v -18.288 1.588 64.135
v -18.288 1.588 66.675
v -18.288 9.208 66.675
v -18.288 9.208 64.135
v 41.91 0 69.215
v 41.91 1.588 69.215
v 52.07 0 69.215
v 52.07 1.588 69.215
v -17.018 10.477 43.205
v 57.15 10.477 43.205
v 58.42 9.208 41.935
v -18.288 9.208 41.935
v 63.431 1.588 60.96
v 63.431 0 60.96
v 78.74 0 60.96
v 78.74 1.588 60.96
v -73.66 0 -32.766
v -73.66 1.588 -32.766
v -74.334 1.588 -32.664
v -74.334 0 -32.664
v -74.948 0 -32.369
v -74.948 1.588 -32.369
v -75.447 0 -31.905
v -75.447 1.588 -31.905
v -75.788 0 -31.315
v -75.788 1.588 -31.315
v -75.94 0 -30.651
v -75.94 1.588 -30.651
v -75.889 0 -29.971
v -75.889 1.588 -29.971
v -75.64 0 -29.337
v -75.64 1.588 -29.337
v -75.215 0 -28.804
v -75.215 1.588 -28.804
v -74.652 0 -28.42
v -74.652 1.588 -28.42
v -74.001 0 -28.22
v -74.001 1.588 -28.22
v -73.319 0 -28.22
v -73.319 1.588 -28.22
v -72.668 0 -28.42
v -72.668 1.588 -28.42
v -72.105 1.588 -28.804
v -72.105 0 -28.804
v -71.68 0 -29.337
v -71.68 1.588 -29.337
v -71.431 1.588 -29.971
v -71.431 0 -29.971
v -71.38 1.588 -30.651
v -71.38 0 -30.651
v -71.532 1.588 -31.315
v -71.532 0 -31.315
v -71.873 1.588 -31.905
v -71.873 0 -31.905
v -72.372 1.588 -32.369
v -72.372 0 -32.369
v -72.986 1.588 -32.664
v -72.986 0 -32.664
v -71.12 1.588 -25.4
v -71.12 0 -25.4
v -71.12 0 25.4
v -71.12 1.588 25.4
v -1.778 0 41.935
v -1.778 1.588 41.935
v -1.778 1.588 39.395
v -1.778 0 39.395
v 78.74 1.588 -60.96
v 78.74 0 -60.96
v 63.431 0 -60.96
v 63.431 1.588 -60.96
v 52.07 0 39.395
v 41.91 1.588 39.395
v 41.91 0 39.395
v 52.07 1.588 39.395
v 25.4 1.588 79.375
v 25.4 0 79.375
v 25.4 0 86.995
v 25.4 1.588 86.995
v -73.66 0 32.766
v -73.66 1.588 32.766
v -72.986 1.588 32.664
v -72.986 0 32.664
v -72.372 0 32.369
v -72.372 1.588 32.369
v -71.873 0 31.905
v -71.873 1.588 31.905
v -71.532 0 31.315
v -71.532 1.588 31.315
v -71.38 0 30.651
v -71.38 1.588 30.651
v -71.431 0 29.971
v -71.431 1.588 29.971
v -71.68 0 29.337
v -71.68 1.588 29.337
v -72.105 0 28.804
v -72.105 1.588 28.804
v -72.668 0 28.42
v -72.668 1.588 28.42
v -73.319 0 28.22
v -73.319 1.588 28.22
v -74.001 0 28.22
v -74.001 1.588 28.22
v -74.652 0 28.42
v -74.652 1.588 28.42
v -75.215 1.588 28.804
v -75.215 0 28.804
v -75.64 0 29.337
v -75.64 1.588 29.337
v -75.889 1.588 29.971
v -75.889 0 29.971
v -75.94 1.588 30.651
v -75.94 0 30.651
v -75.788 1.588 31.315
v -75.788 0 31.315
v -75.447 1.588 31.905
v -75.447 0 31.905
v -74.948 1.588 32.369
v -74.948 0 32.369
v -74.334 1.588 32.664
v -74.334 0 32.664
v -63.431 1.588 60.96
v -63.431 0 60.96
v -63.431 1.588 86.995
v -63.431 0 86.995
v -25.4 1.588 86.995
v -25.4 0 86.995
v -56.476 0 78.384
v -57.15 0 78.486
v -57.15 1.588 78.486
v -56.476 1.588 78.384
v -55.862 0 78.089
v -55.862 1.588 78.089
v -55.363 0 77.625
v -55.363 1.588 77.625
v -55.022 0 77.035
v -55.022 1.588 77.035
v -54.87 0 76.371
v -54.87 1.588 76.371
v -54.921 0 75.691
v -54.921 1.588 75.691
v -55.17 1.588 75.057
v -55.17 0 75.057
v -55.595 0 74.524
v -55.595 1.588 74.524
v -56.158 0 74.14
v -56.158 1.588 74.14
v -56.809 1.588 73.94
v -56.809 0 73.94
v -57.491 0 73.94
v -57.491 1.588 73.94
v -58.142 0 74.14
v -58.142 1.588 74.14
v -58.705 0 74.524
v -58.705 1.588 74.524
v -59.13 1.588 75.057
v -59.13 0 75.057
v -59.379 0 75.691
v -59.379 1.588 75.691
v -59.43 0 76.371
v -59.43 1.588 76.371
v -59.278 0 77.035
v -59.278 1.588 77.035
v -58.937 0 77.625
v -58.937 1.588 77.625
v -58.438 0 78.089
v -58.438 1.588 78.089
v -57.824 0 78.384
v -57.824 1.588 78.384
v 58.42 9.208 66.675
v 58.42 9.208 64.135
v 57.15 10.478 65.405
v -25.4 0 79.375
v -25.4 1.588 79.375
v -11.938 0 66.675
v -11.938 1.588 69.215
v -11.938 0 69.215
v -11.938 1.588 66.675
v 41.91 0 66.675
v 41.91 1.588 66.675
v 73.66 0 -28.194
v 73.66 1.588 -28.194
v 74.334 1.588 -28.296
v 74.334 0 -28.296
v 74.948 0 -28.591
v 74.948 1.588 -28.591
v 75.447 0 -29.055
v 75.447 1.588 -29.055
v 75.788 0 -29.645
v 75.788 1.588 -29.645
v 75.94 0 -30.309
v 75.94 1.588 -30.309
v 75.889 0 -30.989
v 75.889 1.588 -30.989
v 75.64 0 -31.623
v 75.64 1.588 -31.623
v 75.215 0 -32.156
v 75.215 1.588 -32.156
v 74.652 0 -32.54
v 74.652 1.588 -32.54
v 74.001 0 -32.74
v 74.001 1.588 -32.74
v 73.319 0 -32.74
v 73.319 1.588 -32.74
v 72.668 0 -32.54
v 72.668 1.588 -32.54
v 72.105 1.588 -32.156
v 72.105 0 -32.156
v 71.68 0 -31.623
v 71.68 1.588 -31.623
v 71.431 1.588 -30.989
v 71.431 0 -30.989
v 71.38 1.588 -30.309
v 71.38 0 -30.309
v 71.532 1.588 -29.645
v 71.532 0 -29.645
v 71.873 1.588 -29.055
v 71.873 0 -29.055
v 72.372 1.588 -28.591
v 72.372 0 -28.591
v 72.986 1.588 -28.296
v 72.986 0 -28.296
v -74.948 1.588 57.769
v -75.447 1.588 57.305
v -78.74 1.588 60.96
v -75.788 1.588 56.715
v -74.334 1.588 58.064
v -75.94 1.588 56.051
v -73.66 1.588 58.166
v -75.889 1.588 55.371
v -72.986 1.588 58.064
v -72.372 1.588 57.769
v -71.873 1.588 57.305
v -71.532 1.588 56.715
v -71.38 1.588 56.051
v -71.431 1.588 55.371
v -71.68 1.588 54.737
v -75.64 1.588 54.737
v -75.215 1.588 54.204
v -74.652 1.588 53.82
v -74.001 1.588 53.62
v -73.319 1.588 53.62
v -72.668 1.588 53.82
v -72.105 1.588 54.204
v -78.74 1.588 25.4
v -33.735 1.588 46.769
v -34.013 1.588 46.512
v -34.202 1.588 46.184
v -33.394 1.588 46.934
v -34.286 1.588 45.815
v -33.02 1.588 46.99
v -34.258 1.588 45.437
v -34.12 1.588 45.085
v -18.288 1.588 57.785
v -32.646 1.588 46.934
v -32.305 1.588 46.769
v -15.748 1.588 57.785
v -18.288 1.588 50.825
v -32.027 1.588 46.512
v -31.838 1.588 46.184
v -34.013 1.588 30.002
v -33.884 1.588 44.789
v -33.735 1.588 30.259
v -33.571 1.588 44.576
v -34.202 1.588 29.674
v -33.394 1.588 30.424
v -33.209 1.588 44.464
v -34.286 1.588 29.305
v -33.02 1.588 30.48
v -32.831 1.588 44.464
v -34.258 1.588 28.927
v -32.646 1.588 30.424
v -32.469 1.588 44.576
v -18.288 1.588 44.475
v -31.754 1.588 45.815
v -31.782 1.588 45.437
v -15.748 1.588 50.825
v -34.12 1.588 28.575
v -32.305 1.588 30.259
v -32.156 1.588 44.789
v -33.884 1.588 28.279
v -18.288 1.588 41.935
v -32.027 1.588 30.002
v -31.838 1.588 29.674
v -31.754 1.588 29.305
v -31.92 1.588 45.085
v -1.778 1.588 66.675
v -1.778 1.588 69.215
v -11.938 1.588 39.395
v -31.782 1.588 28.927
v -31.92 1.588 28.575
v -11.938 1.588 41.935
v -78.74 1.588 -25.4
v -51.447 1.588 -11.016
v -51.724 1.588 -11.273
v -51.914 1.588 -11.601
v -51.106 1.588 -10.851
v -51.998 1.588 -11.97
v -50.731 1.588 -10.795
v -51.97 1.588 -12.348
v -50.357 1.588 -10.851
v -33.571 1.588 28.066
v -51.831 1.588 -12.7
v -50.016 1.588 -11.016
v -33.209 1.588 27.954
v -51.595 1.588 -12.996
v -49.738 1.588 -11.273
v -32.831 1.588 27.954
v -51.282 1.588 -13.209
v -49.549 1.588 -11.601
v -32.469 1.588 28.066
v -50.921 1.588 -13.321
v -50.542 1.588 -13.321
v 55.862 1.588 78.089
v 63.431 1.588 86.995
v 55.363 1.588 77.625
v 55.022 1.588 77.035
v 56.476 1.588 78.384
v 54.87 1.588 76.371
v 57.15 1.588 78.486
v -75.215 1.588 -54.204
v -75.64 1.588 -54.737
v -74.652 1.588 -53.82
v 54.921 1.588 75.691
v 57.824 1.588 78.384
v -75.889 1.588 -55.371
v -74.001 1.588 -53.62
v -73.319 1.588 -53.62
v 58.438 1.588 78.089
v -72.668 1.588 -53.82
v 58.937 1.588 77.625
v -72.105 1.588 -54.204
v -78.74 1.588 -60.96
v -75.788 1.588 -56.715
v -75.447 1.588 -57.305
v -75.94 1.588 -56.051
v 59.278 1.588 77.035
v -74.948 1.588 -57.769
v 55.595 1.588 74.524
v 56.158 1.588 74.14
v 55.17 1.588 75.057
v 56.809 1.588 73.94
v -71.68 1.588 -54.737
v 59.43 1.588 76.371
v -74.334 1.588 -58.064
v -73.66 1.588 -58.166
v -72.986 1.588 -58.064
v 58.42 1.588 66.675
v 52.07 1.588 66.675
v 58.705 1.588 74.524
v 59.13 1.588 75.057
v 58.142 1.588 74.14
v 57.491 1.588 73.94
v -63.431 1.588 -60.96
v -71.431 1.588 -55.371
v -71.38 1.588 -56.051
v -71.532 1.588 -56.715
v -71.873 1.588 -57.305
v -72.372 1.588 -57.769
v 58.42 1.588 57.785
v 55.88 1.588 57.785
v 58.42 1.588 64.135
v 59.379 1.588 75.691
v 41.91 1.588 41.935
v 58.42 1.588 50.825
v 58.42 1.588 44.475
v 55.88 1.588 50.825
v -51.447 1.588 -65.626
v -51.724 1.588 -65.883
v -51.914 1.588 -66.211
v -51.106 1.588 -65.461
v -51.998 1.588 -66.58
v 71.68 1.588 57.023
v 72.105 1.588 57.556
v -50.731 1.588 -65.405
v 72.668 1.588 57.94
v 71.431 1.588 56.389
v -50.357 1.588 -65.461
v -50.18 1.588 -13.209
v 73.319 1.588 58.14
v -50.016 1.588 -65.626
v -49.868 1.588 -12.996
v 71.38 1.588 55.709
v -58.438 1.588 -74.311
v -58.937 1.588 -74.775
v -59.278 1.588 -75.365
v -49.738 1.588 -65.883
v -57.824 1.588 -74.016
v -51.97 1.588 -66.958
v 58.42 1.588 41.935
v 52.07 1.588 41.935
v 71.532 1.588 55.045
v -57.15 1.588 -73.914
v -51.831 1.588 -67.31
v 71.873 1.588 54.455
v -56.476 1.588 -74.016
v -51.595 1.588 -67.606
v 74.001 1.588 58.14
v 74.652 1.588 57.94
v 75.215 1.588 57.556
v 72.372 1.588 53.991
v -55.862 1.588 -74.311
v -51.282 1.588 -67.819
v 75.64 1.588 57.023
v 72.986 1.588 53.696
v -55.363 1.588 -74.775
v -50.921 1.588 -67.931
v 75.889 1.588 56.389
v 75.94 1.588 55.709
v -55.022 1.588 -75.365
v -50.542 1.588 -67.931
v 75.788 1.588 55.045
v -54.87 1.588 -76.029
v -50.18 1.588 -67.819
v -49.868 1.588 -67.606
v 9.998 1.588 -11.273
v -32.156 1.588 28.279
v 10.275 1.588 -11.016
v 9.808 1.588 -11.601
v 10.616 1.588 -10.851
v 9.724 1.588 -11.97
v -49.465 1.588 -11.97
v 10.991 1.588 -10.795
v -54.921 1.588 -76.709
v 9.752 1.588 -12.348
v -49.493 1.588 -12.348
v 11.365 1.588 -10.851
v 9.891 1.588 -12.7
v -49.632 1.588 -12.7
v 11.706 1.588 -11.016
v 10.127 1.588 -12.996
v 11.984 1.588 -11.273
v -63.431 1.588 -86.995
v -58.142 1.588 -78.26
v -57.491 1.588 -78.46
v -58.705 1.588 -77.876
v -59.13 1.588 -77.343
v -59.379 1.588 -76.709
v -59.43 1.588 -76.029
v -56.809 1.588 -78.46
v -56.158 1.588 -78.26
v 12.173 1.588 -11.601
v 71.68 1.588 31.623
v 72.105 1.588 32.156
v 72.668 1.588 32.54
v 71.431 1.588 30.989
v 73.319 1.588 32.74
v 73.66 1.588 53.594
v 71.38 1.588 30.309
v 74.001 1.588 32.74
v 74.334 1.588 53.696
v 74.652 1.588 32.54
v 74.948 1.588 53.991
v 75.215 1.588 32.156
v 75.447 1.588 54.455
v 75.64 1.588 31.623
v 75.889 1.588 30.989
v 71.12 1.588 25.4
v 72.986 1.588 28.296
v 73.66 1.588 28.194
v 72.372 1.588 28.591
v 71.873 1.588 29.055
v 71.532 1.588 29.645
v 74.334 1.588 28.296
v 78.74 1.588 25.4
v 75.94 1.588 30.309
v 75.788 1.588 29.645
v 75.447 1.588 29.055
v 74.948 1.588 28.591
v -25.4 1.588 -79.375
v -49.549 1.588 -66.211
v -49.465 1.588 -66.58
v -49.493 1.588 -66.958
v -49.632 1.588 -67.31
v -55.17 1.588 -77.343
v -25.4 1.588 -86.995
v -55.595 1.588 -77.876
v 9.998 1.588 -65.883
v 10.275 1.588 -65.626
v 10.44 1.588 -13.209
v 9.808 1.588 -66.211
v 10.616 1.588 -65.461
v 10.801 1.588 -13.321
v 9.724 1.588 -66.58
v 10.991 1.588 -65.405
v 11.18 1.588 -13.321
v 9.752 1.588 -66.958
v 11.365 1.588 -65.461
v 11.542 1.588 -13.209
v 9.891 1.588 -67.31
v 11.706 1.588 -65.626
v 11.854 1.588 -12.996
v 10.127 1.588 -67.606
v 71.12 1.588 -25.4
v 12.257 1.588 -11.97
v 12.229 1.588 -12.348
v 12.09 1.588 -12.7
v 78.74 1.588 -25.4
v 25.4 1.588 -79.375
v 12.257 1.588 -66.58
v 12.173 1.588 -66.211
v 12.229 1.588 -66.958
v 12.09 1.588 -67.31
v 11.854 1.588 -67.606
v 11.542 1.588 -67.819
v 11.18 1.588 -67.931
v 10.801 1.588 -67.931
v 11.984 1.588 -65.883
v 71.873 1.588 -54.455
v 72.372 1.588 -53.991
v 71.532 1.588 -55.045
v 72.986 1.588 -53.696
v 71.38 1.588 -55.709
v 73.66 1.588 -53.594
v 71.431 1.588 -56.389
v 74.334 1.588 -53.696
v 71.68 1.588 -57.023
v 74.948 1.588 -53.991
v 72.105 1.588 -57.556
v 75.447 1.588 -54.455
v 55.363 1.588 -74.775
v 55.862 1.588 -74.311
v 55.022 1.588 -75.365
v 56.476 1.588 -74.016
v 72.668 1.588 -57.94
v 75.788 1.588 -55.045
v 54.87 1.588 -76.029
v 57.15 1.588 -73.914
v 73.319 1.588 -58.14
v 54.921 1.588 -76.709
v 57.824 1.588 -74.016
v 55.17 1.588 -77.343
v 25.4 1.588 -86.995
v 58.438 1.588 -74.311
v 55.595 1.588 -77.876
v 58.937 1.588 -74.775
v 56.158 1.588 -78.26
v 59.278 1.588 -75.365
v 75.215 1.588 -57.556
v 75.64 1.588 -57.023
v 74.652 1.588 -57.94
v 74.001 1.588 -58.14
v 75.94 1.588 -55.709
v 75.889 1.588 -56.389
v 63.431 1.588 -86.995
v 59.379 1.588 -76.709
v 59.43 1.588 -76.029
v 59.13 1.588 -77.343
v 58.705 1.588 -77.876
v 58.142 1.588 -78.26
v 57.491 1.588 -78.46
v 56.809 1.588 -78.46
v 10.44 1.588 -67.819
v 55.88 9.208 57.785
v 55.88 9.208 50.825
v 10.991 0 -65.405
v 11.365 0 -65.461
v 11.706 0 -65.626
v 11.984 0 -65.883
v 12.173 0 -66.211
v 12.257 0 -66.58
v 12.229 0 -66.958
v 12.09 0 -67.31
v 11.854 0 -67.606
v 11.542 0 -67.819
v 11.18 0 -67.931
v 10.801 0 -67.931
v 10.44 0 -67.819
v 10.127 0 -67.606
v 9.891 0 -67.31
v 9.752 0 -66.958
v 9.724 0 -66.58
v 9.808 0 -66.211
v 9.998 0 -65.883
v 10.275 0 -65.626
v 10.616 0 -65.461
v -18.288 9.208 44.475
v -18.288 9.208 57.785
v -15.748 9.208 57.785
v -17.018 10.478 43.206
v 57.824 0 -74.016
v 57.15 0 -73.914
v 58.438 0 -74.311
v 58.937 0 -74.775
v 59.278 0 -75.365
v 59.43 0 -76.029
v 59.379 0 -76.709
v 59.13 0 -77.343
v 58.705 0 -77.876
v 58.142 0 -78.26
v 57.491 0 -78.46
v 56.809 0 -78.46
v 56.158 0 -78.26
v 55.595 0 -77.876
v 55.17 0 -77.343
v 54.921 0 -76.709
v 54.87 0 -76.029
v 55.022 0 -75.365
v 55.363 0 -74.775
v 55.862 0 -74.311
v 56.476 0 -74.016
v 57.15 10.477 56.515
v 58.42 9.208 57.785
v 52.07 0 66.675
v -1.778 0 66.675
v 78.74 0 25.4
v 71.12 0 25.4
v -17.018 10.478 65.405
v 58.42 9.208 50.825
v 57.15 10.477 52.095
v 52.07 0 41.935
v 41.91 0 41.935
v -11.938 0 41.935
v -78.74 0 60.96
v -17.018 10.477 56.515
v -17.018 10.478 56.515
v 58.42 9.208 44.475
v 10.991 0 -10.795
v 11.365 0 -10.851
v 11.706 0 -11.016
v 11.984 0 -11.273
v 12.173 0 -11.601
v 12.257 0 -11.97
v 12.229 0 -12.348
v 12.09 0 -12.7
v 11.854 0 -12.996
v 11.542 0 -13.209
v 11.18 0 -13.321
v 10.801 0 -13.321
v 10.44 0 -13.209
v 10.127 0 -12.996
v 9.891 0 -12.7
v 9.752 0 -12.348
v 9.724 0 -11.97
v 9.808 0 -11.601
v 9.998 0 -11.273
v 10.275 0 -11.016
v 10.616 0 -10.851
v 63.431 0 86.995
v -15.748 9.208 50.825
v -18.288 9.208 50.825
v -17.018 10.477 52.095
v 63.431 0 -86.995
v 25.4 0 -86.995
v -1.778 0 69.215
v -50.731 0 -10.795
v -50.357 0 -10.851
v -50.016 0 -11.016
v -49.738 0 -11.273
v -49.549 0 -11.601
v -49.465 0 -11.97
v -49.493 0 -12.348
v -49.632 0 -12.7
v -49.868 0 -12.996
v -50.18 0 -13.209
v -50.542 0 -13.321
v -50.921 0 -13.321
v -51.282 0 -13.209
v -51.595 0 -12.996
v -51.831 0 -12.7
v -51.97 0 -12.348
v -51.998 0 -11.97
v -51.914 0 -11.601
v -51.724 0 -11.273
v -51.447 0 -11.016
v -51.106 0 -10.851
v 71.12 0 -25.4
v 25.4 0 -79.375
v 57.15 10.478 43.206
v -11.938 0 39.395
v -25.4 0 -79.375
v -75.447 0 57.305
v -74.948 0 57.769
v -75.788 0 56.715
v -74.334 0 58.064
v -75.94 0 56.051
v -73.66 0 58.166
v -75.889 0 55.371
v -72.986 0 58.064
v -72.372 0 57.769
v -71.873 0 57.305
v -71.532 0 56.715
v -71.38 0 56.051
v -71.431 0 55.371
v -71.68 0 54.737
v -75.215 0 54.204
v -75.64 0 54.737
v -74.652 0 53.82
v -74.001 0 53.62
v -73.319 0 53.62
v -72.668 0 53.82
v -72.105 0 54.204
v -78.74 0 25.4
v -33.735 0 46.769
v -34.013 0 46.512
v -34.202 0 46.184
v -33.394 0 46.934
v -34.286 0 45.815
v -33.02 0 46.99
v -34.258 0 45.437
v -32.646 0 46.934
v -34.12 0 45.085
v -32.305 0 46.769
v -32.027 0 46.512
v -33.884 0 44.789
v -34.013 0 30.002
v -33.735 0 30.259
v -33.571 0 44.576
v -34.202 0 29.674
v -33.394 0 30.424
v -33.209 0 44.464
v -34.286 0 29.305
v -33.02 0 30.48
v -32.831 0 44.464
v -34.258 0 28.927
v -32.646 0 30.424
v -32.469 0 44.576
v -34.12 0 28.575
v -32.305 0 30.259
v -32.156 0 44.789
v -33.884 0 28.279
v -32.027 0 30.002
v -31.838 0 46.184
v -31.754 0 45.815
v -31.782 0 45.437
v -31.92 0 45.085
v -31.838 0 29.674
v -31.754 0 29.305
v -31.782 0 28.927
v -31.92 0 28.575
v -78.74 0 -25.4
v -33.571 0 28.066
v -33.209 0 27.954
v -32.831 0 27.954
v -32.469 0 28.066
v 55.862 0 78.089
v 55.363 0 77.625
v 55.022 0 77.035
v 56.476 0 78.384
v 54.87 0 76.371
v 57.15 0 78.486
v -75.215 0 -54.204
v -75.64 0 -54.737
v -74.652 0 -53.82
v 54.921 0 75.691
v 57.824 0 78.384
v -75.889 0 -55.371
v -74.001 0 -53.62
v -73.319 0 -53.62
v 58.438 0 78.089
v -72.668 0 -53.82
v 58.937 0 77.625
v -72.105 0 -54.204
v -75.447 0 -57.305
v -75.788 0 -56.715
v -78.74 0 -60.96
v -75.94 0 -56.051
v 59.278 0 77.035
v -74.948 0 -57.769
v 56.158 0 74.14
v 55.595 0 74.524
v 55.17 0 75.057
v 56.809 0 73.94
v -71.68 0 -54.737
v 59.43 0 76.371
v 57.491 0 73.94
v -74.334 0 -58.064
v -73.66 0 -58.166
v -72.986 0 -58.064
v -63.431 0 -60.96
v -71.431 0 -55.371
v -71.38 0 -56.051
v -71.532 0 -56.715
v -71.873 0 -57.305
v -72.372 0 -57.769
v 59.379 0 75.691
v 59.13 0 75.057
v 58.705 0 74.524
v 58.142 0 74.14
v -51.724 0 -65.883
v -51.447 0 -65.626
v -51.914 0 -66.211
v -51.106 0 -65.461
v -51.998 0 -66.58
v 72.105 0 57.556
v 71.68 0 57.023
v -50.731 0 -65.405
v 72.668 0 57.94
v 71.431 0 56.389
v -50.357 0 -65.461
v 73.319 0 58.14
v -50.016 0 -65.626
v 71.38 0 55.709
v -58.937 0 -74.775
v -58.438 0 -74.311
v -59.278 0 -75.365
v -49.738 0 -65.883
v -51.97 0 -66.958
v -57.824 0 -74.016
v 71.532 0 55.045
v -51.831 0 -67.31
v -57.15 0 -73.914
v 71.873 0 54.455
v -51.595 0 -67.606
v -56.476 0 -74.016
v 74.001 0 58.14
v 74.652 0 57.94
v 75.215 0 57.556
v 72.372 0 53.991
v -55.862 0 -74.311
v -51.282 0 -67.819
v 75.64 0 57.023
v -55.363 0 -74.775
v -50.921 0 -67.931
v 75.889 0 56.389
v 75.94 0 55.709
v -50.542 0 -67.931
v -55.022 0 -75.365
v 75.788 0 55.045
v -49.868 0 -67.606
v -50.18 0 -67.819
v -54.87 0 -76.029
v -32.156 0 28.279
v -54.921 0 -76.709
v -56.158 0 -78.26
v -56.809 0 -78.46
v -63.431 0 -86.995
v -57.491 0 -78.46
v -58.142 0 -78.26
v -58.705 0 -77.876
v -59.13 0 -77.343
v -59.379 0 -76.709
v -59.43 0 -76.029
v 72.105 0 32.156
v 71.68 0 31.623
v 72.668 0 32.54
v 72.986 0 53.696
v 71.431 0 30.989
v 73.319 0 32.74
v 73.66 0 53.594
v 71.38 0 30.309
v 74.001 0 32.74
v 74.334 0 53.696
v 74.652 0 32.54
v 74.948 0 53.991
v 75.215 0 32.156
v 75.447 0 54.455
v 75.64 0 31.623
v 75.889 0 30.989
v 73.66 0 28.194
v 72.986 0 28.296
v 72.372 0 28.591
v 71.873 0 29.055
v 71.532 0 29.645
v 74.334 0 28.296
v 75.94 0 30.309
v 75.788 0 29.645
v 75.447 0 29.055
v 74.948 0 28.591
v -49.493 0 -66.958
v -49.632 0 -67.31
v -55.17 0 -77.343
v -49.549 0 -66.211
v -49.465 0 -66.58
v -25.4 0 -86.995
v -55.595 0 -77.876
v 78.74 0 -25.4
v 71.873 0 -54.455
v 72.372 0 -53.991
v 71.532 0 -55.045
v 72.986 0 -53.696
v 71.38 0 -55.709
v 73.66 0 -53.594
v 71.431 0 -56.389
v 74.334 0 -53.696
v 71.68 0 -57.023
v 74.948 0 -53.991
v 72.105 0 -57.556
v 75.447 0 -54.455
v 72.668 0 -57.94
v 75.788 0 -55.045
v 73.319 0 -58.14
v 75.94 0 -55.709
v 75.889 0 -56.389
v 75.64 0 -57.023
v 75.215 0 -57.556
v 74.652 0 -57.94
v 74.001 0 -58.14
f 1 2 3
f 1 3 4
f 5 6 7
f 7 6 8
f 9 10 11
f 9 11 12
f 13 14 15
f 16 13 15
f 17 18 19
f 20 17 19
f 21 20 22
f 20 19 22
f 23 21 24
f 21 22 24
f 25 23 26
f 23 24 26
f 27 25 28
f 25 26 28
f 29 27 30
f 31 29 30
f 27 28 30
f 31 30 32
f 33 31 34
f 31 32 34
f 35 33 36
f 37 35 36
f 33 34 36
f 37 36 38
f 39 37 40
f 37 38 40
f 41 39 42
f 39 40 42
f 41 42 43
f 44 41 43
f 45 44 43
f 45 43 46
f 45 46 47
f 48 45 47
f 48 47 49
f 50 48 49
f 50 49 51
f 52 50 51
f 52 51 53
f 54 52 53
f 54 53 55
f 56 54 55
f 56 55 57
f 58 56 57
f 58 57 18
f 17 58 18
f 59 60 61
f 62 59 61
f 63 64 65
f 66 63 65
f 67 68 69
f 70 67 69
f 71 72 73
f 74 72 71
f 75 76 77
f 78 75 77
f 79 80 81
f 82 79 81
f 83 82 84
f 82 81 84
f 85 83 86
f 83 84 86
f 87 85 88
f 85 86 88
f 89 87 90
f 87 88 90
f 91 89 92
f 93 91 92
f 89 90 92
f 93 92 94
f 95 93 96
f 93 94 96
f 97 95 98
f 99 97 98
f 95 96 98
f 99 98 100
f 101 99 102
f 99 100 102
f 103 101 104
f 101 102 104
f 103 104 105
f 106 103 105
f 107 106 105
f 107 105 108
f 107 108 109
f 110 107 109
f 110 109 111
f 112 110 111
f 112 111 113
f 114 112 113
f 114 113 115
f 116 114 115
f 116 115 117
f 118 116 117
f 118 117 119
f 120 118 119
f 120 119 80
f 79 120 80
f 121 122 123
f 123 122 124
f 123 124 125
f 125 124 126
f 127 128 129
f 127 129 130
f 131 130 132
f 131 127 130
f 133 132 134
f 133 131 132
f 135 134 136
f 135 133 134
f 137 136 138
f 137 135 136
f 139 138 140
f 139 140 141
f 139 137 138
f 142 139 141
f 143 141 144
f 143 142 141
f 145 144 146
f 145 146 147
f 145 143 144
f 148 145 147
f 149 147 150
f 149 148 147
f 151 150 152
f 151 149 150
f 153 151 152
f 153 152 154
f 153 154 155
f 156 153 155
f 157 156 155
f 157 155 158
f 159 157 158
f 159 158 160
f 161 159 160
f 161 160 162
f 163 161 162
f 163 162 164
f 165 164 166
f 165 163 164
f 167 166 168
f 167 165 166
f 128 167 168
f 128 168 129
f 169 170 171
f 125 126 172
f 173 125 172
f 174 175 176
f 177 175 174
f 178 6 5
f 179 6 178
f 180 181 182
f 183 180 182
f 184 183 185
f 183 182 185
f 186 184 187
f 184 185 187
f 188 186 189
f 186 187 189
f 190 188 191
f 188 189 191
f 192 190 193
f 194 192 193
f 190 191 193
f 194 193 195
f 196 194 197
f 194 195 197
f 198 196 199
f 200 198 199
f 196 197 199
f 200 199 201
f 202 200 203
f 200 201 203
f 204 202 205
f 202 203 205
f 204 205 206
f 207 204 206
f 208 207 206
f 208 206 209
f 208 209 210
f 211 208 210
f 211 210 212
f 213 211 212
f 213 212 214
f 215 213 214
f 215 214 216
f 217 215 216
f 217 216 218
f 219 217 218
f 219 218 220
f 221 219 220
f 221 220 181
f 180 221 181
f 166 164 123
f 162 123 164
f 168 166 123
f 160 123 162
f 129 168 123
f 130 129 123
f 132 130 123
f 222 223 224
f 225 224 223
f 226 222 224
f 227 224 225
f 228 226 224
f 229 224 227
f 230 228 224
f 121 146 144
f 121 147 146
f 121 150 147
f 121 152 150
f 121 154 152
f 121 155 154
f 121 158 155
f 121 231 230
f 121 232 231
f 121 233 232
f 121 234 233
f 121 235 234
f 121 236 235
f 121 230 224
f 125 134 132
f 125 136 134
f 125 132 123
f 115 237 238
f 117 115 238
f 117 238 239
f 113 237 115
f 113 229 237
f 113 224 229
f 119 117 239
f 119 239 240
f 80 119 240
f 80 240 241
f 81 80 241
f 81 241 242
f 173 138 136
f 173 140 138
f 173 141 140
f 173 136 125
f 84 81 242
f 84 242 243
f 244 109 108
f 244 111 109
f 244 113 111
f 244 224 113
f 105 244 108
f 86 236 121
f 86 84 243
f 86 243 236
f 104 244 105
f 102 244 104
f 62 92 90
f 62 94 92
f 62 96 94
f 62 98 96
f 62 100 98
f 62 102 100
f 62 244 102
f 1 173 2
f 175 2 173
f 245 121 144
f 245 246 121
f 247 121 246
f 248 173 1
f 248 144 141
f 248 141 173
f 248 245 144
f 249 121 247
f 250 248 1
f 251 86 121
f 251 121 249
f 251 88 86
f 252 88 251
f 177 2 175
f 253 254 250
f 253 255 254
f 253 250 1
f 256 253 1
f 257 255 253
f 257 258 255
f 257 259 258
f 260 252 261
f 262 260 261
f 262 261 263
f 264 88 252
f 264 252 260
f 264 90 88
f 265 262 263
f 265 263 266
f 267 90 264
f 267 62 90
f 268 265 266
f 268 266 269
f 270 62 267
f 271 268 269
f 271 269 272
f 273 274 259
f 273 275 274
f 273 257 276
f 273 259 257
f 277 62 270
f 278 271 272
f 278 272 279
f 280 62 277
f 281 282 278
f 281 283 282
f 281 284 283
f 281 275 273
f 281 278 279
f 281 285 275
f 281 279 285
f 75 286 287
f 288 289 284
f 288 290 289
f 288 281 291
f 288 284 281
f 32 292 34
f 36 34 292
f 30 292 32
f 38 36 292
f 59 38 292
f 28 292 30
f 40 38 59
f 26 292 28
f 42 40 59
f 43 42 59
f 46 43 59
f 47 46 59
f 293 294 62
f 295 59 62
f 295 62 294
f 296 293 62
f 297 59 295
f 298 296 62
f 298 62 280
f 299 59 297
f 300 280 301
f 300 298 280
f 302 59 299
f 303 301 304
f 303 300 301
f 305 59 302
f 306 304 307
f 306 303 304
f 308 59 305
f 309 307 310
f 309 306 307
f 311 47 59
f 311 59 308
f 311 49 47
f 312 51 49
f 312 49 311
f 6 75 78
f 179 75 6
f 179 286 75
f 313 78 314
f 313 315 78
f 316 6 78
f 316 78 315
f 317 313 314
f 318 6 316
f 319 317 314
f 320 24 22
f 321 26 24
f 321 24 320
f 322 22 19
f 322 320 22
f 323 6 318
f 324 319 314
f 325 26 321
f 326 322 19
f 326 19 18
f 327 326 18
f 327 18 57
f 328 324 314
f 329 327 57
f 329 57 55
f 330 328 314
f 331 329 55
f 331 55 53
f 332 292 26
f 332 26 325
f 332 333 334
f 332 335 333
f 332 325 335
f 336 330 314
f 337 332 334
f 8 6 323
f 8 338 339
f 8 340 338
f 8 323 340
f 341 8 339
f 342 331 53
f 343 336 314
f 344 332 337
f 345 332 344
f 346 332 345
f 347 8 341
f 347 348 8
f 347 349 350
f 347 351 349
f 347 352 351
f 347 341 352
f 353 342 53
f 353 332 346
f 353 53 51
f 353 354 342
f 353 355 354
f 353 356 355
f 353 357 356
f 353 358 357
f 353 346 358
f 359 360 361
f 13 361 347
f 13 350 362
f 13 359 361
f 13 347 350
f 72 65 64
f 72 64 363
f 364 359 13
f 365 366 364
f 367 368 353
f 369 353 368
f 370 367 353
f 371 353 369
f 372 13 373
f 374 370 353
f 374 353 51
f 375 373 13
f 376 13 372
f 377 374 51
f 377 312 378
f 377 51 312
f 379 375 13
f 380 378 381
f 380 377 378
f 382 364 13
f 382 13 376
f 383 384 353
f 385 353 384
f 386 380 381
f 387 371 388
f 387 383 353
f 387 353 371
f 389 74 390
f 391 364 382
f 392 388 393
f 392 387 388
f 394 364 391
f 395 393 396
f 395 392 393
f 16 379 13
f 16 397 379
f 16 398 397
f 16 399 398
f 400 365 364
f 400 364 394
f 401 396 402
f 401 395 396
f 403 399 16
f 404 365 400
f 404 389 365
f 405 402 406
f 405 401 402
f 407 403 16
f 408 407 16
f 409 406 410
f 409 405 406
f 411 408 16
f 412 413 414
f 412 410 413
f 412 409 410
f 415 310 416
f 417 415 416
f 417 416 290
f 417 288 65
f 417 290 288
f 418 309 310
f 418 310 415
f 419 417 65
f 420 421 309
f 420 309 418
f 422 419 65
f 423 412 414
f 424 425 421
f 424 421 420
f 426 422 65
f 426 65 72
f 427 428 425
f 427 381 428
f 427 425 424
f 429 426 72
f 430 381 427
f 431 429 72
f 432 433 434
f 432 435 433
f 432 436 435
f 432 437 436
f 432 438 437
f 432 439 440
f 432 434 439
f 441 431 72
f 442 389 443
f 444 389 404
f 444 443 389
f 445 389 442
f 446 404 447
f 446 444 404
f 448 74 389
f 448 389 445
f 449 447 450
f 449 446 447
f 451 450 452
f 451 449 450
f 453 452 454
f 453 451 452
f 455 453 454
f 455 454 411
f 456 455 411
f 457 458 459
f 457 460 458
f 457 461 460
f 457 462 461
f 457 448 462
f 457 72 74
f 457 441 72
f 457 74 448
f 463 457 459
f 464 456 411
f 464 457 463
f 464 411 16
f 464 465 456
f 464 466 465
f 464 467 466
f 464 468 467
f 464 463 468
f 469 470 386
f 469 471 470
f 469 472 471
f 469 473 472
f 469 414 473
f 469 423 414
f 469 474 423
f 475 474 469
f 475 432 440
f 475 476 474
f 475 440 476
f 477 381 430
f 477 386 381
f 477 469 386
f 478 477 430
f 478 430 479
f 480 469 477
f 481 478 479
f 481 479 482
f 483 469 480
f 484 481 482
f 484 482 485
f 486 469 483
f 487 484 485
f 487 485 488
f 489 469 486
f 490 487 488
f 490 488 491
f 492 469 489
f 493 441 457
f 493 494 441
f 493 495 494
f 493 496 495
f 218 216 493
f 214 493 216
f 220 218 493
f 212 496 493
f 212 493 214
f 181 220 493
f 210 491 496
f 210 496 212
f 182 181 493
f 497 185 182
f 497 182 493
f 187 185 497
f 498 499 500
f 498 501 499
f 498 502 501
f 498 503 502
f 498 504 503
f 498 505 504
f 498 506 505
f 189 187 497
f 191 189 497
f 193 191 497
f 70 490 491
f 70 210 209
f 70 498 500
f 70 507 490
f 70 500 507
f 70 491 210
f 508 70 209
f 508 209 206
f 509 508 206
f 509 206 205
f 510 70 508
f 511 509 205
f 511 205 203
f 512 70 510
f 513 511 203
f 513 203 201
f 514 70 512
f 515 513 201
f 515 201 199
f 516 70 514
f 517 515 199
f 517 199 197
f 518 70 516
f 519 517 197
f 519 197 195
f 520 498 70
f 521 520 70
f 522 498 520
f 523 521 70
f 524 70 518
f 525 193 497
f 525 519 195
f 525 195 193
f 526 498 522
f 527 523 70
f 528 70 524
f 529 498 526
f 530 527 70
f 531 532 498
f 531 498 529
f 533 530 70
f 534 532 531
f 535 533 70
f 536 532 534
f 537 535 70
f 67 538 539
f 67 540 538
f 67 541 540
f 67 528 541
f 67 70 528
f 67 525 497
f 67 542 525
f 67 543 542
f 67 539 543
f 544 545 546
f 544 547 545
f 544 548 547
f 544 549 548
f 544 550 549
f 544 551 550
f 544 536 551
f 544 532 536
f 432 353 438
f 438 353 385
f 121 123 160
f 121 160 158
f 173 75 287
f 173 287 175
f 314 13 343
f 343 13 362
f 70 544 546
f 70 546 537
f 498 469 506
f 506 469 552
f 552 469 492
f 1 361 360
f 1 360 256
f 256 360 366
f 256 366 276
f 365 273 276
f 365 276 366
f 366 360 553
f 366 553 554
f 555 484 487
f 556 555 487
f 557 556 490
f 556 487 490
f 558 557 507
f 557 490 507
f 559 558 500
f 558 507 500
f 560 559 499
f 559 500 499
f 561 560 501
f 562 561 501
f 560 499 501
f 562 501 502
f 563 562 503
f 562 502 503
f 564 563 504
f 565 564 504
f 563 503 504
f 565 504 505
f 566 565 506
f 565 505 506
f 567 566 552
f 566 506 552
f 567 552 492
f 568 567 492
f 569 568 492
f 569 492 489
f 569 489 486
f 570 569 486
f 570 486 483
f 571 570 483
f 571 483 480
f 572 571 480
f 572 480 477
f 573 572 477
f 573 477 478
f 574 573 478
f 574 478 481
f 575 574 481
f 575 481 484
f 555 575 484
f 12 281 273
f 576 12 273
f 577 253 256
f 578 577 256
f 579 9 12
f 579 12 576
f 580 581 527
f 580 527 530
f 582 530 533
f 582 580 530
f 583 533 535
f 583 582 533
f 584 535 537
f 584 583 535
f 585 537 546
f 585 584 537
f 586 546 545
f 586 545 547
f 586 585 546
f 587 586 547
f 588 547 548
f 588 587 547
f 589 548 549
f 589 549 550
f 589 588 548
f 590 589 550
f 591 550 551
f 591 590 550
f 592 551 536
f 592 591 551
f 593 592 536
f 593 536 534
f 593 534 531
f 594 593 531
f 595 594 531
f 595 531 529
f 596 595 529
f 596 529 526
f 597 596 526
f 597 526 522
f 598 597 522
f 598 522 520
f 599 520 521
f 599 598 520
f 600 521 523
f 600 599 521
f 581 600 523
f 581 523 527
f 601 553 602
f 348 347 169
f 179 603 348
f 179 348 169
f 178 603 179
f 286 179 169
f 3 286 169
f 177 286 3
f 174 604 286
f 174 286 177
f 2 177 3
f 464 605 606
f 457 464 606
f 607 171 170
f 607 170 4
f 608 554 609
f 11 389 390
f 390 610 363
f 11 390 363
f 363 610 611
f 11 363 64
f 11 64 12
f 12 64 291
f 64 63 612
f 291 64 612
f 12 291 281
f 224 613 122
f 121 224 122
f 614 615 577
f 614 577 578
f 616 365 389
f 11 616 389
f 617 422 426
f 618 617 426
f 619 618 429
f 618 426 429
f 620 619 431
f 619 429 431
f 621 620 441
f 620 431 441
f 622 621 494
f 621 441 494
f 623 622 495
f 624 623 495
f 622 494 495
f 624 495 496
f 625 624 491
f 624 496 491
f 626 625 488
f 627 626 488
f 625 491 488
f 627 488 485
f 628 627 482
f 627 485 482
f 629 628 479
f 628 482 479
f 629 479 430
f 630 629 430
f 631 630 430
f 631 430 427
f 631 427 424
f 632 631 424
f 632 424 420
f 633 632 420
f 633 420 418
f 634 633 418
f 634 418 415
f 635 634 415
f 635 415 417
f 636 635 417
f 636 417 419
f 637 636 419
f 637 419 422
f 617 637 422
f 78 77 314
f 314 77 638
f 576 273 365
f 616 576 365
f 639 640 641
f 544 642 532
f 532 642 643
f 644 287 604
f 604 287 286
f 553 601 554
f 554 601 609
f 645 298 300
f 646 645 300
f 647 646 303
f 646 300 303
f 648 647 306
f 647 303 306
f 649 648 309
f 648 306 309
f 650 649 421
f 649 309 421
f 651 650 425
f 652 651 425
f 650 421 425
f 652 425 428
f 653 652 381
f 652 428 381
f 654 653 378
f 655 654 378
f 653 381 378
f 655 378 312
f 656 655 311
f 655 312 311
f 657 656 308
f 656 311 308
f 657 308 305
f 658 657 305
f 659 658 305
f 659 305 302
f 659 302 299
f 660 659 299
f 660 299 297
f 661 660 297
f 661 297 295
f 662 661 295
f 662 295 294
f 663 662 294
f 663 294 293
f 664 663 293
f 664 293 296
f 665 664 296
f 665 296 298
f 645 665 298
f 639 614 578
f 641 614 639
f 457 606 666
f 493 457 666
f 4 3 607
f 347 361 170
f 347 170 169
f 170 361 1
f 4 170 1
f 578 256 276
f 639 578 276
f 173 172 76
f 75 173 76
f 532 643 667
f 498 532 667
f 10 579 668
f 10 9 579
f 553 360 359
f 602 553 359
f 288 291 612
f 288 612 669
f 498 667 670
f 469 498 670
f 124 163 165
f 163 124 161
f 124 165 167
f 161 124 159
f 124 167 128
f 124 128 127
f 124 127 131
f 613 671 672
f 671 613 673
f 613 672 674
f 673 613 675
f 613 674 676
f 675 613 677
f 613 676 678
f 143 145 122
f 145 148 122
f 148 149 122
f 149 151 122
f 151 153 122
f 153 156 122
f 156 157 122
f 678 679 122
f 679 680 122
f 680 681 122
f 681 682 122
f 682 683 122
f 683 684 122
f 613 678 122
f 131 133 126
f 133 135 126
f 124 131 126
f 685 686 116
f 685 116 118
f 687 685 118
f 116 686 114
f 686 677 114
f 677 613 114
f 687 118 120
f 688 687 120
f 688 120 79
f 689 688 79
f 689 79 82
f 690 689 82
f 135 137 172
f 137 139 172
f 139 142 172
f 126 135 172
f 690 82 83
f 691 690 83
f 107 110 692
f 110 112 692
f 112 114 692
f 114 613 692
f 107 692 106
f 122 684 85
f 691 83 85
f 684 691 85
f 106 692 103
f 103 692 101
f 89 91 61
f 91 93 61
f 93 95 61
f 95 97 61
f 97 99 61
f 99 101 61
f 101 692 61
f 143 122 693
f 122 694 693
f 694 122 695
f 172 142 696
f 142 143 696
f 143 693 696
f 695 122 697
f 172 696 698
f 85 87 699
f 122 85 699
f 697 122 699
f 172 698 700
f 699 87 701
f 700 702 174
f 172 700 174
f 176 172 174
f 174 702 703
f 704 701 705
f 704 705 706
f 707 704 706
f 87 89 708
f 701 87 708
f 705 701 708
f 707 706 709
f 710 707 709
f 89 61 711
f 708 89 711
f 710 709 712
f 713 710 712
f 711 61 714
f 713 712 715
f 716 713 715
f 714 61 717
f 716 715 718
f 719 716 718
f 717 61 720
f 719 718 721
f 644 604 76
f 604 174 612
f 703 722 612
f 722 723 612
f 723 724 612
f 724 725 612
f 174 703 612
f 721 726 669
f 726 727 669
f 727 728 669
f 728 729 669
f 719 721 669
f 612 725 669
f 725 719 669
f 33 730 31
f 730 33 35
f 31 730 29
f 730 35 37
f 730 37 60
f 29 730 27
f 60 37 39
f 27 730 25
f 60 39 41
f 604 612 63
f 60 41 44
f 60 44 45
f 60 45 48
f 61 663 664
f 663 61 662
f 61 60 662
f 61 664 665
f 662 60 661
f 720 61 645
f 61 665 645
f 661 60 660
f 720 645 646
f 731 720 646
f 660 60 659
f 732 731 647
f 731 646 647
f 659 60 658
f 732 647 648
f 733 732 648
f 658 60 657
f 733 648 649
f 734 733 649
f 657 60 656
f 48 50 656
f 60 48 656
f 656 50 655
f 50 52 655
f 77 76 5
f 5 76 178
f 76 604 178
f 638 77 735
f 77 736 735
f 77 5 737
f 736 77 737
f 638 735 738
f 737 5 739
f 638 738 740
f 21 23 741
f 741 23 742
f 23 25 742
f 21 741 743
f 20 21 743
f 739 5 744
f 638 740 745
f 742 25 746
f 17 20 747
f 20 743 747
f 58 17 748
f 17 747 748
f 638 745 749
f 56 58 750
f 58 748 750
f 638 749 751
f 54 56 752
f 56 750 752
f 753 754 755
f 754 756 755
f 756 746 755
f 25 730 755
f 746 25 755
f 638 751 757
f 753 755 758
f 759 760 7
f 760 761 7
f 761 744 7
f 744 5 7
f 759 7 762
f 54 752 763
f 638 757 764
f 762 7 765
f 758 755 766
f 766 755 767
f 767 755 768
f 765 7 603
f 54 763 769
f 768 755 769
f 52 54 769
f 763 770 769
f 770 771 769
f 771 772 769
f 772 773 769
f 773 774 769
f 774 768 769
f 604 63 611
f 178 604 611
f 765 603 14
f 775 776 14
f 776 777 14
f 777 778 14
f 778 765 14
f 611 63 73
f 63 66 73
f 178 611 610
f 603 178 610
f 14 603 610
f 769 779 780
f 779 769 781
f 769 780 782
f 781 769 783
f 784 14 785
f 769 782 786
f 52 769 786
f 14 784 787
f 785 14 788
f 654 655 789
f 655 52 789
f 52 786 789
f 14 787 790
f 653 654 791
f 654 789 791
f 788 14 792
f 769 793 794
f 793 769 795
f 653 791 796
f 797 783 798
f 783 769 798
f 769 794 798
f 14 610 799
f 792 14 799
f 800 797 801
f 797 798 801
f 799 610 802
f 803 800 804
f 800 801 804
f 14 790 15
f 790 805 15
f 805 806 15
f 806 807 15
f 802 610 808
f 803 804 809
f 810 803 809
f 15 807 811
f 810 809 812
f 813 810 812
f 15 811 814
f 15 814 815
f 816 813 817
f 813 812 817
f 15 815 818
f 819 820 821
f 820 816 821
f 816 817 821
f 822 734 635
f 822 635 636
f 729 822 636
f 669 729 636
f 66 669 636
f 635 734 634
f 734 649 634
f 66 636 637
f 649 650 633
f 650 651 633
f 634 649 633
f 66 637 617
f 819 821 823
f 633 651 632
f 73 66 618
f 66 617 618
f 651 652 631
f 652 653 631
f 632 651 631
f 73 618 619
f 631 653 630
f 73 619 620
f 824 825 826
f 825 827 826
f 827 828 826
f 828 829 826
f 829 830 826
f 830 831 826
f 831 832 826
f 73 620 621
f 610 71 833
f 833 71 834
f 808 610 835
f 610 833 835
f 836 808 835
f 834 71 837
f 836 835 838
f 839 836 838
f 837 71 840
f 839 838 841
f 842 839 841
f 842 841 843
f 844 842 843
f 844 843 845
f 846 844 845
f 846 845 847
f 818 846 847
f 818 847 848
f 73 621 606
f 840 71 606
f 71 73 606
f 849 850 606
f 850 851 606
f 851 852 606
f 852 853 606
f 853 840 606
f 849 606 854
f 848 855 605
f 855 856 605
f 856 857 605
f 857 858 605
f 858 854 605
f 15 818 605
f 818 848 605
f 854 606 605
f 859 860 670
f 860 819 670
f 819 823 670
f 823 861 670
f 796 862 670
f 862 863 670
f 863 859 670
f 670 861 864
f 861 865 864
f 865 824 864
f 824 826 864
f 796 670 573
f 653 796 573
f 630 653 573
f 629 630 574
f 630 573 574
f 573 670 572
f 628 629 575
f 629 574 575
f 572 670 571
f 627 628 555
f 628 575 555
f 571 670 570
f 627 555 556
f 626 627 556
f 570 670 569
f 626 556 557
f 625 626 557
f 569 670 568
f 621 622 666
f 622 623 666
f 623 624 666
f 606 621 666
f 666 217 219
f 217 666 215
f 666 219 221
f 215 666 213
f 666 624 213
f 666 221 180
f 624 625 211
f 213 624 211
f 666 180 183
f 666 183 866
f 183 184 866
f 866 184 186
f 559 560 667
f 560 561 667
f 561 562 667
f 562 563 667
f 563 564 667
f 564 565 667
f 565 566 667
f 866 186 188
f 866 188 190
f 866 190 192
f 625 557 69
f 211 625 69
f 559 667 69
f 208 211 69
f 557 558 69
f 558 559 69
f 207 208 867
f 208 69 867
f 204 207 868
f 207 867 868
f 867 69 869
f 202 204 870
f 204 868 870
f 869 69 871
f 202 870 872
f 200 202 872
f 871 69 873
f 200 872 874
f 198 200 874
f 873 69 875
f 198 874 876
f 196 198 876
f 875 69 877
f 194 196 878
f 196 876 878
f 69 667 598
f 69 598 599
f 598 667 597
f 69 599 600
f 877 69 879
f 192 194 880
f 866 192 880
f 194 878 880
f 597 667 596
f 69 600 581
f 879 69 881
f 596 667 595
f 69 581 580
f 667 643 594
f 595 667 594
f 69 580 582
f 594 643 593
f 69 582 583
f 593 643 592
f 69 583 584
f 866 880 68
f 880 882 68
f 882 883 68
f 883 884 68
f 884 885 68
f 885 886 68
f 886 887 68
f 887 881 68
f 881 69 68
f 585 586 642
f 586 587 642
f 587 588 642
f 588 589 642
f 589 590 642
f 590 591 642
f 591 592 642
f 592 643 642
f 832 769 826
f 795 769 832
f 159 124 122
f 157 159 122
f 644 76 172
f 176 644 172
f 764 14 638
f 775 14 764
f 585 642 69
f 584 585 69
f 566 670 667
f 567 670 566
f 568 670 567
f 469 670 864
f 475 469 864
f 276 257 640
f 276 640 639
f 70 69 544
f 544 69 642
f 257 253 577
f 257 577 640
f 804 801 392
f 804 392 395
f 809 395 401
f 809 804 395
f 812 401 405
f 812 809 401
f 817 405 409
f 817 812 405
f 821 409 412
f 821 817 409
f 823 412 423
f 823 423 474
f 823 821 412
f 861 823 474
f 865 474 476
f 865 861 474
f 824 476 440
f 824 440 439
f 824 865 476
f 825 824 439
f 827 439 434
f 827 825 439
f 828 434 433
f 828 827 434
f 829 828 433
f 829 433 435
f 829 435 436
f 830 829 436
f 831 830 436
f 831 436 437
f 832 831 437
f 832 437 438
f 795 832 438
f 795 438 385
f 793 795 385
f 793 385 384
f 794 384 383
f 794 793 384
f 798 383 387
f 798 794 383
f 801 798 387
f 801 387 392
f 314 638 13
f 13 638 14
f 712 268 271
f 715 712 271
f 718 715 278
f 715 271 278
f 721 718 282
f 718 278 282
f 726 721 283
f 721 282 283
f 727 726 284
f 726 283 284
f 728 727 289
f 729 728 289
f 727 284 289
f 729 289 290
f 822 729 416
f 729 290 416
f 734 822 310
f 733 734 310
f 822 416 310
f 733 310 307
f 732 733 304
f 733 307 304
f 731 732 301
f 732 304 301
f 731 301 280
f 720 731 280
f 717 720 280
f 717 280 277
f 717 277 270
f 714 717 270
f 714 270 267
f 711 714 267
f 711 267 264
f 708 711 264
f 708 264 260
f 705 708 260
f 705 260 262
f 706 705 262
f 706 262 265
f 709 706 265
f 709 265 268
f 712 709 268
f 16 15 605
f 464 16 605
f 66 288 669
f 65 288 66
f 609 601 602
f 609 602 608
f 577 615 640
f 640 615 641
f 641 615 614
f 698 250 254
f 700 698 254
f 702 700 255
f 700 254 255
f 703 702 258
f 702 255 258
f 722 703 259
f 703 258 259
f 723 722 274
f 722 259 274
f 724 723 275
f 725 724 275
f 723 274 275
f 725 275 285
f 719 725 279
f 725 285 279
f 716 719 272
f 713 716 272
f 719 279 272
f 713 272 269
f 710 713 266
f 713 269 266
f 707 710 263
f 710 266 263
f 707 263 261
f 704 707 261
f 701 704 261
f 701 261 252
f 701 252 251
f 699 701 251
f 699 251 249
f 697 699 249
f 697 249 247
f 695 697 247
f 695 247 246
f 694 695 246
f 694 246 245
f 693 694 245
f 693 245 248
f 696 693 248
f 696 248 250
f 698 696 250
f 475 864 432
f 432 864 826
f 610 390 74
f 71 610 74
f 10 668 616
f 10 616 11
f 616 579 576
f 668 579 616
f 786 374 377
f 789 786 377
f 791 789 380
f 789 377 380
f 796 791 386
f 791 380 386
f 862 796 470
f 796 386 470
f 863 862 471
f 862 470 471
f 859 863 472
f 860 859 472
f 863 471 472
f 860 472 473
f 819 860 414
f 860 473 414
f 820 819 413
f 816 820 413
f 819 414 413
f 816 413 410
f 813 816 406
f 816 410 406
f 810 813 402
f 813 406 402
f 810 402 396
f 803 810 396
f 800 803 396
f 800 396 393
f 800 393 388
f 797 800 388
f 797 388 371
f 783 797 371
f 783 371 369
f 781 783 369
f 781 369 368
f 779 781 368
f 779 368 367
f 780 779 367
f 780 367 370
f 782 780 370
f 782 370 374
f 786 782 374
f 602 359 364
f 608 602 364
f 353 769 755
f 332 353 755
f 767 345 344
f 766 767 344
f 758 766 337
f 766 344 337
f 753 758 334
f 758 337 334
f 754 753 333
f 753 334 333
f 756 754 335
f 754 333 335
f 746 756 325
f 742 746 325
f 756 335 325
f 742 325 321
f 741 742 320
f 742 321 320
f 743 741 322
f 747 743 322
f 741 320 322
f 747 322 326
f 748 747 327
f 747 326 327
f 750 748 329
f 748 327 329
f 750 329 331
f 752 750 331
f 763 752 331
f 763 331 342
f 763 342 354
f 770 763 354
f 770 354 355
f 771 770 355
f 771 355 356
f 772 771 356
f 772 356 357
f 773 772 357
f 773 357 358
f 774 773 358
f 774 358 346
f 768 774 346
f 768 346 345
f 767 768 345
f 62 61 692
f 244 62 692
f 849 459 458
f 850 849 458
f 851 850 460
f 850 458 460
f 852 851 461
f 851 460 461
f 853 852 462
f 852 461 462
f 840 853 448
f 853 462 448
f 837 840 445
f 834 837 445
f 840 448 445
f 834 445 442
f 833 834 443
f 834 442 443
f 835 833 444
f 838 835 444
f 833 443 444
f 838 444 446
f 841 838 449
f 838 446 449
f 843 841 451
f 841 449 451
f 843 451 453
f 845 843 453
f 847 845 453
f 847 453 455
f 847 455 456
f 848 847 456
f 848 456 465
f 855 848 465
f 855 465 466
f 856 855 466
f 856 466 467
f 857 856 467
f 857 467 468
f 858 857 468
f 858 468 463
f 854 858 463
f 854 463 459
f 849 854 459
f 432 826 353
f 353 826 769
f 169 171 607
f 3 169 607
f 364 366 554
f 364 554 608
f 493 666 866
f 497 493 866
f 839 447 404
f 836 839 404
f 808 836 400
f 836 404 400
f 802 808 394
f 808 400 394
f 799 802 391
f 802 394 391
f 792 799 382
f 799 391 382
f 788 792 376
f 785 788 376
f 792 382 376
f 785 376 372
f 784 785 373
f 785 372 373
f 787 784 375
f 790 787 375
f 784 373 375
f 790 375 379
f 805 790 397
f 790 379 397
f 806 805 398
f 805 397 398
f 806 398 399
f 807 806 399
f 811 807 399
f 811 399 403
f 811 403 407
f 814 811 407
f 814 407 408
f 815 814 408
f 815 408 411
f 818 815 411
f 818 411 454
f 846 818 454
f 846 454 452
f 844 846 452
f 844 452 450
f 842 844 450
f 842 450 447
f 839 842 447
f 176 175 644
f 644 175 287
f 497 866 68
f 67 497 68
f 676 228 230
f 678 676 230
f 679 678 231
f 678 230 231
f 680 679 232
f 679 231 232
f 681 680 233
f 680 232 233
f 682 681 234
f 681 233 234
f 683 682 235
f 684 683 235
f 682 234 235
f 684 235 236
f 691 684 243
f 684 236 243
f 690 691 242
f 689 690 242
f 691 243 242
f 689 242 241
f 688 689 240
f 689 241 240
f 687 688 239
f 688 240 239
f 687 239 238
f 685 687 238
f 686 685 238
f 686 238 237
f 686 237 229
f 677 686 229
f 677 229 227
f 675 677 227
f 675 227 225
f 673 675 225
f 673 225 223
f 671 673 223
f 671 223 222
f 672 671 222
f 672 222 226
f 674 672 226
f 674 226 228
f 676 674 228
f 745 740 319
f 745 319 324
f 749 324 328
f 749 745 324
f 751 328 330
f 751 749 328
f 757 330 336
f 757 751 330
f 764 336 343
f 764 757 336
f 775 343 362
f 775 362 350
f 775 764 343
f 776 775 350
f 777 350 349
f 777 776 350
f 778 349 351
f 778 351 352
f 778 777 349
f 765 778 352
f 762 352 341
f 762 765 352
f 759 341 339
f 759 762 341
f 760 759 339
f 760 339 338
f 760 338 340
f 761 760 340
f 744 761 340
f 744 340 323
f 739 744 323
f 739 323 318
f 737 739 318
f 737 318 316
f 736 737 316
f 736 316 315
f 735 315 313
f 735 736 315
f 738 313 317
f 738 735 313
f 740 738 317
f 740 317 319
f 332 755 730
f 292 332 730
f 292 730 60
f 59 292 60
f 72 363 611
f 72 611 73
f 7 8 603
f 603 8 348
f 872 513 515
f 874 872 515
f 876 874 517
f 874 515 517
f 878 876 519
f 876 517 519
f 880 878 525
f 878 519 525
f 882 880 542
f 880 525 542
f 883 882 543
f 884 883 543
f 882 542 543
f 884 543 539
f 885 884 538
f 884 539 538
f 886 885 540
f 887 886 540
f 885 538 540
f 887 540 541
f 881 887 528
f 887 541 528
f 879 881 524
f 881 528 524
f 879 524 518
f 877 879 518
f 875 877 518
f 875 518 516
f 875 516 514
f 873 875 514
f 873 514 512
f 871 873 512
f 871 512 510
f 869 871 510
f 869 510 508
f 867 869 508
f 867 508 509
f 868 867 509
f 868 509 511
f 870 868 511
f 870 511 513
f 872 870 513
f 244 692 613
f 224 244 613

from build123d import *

# Parameters (mm, degrees)
SKETCH1_R           = 2.286
BOSS_EXTRUDE1_DEPTH = 1.5875
SKETCH2_R           = 2.286
CUT_EXTRUDE1_DEPTH  = 118.348360795
SKETCH3_R           = 1.27
CUT_EXTRUDE2_DEPTH  = 118.348360795
SKETCH4_W           = 2.54
SKETCH4_H           = 6.9596
BOSS_EXTRUDE2_DEPTH = 8.89
CHAMFER1_SIZE       = 1.27
SKETCH5_W           = 10.16
SKETCH5_H           = 2.54
CUT_EXTRUDE3_DEPTH  = 118.673912678
SKETCH6_R           = 1.27
CUT_EXTRUDE4_DEPTH  = 8.89


with BuildPart() as part:
    # Sketch1 → Boss-Extrude1 (new body)
    with BuildSketch(Plane(origin=(0, 0, 0), x_dir=(1, 0, 0), z_dir=(0, 1, 0))):
        Polygon((-25.4, 86.995), (-63.43142, 86.995), (-63.43142, 60.96), (-78.74, 60.96), (-78.74, 25.4), (-71.12, 25.4), (-71.12, -25.4), (-78.74, -25.4), (-78.74, -60.96), (-63.43142, -60.96), (-63.43142, -86.995), (-25.4, -86.995), (-25.4, -79.375), (25.4, -79.375), (25.4, -86.995), (63.43142, -86.995), (63.43142, -60.96), (78.74, -60.96), (78.74, -25.4), (71.12, -25.4), (71.12, 25.4), (78.74, 25.4), (78.74, 60.96), (63.43142, 60.96), (63.43142, 86.995), (25.4, 86.995), (25.4, 79.375), (-25.4, 79.375), align=None)
        with Locations(Location((-57.15, 76.2, 0), (0, 0, 270))):
            Circle(SKETCH1_R, mode=Mode.SUBTRACT)
        with Locations(Location((57.15, 76.2, 0), (0, 0, 270))):
            Circle(SKETCH1_R, mode=Mode.SUBTRACT)
        with Locations(Location((57.15, -76.2, 0), (0, 0, 270))):
            Circle(SKETCH1_R, mode=Mode.SUBTRACT)
        with Locations(Location((-57.15, -76.2, 0), (0, 0, 270))):
            Circle(SKETCH1_R, mode=Mode.SUBTRACT)
    extrude(amount=BOSS_EXTRUDE1_DEPTH)

    # Sketch2 → Cut-Extrude1 (cut, through all)
    with BuildSketch(Plane(origin=(0, 1.5875, 0), x_dir=(1, 0, 0), z_dir=(0, 1, 0))):
        with Locations(Location((-73.66, -30.48, 0), (0, 0, 270))):
            Circle(SKETCH2_R)
        with Locations(Location((-73.66, -55.88, 0), (0, 0, 270))):
            Circle(SKETCH2_R)
        with Locations(Location((73.66, -55.88, 0), (0, 0, 90))):
            Circle(SKETCH2_R)
        with Locations(Location((73.66, -30.48, 0), (0, 0, 90))):
            Circle(SKETCH2_R)
        with Locations(Location((73.66, 30.48, 0), (0, 0, 270))):
            Circle(SKETCH2_R)
        with Locations(Location((73.66, 55.88, 0), (0, 0, 270))):
            Circle(SKETCH2_R)
        with Locations(Location((-73.66, 55.88, 0), (0, 0, 90))):
            Circle(SKETCH2_R)
        with Locations(Location((-73.66, 30.48, 0), (0, 0, 90))):
            Circle(SKETCH2_R)
    extrude(amount=-CUT_EXTRUDE1_DEPTH, mode=Mode.SUBTRACT)

    # Sketch3 → Cut-Extrude2 (cut, through all)
    with BuildSketch(Plane(origin=(0, 1.5875, 0), x_dir=(1, 0, 0), z_dir=(0, 1, 0))):
        with Locations(Location((-50.73142, 66.675, 0), (0, 0, 270))):
            Circle(SKETCH3_R)
        with Locations(Location((10.99058, 66.675, 0), (0, 0, 270))):
            Circle(SKETCH3_R)
        with Locations(Location((10.99058, 12.065, 0), (0, 0, 270))):
            Circle(SKETCH3_R)
        with Locations(Location((-50.73142, 12.065, 0), (0, 0, 270))):
            Circle(SKETCH3_R)
    extrude(amount=-CUT_EXTRUDE2_DEPTH, mode=Mode.SUBTRACT)

    # Sketch4 → Boss-Extrude2 (add)
    with BuildSketch(Plane(origin=(0, 1.5875, 0), x_dir=(1, 0, 0), z_dir=(0, 1, 0))):
        Polygon((-15.748, -44.4754), (55.88, -44.4754), (58.42, -44.4754), (58.42, -41.9354), (-18.288, -41.9354), (-18.288, -44.4754), align=None)
        with Locations((-17.018, -54.3052)):
            Rectangle(SKETCH4_W, SKETCH4_H)
        Polygon((-15.748, -64.135), (55.88, -64.135), (58.42, -64.135), (58.42, -66.675), (-18.288, -66.675), (-18.288, -64.135), align=None)
        with Locations((57.15, -54.3052)):
            Rectangle(SKETCH4_W, SKETCH4_H)
    extrude(amount=BOSS_EXTRUDE2_DEPTH)

    # Chamfer1
    chamfer1_edges = [part.edges().sort_by_distance(p)[0] for p in [
        (20.066, 10.4775, 44.4754),
        (58.42, 10.4775, 43.2054),
        (20.066, 10.4775, 41.9354),
        (-18.288, 10.4775, 43.2054),
        (20.066, 10.4775, 64.135),
        (-18.288, 10.4775, 65.405),
        (20.066, 10.4775, 66.675),
        (58.42, 10.4775, 65.405),
        (-17.018, 10.4775, 50.8254),
        (-18.288, 10.4775, 54.3052),
        (-17.018, 10.4775, 57.785),
        (-15.748, 10.4775, 54.3052),
        (58.42, 10.4775, 54.3052),
        (57.15, 10.4775, 50.8254),
        (55.88, 10.4775, 54.3052),
        (57.15, 10.4775, 57.785),
    ]]
    chamfer(chamfer1_edges, length=CHAMFER1_SIZE - 0.0001)  # a hair under: the kernel refuses the full size

    # Sketch5 → Cut-Extrude3 (cut, through all)
    with BuildSketch(Plane(origin=(0, 1.5875, 0), x_dir=(1, 0, 0), z_dir=(0, 1, 0))):
        with Locations((-6.858, -40.6654)):
            Rectangle(SKETCH5_W, SKETCH5_H)
        with Locations((46.99, -40.6654)):
            Rectangle(SKETCH5_W, SKETCH5_H)
        with Locations((46.99, -67.945)):
            Rectangle(SKETCH5_W, SKETCH5_H)
        with Locations((-6.858, -67.945)):
            Rectangle(SKETCH5_W, SKETCH5_H)
    extrude(amount=-CUT_EXTRUDE3_DEPTH, mode=Mode.SUBTRACT)

    # Sketch6 → Cut-Extrude4 (cut)
    with BuildSketch(Plane(origin=(0, 1.5875, 0), x_dir=(1, 0, 0), z_dir=(0, 1, 0))):
        with Locations(Location((-33.02, -29.21, 0), (0, 0, 270))):
            Circle(SKETCH6_R)
        with Locations(Location((-33.02, -45.72, 0), (0, 0, 270))):
            Circle(SKETCH6_R)
    extrude(amount=-CUT_EXTRUDE4_DEPTH, mode=Mode.SUBTRACT)


solid = part.part
